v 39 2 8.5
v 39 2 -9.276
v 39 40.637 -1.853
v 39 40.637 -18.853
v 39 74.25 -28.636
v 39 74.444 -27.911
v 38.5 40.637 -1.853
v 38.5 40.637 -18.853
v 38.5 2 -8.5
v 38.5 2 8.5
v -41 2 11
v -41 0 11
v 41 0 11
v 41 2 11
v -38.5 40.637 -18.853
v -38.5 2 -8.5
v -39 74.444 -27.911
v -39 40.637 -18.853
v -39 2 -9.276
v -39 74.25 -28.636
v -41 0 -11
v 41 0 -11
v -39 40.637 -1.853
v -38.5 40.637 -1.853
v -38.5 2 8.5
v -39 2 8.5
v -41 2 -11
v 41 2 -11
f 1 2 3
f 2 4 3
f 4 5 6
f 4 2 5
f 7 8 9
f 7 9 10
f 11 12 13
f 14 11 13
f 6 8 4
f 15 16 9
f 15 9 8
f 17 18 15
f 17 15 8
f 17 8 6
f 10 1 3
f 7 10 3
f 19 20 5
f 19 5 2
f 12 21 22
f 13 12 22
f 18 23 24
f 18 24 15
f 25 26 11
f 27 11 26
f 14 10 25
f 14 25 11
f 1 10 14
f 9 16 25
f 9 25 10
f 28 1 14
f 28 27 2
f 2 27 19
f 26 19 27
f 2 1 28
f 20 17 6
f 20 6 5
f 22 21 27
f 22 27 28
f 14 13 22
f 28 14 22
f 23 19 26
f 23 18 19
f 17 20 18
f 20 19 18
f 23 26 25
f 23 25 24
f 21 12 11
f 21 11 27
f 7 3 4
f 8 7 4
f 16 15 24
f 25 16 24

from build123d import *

# Parameters (mm, degrees)
SKETCH1_W           = 82
SKETCH1_H           = 22
BOSS_EXTRUDE1_DEPTH = 2
EXTRUDE_THIN2_DEPTH = 78
BOSS_EXTRUDE2_DEPTH = 0.5
BOSS_EXTRUDE3_DEPTH = 0.5


with BuildPart() as part:
    # Sketch1 → Boss-Extrude1 (new body)
    with BuildSketch(Plane(origin=(0, 0, 0), x_dir=(1, 0, 0), z_dir=(0, 1, 0))):
        Rectangle(SKETCH1_W, SKETCH1_H)
    extrude(amount=BOSS_EXTRUDE1_DEPTH)

    # Sketch4 → Extrude-Thin2 (add)
    with BuildSketch(Plane(origin=(-39, 0, 0), x_dir=(0, 0, -1), z_dir=(1, 0, 0))):
        Polygon((8.5, 2), (27.911428383, 74.444436972), (28.635872752, 74.250322688), (9.22444437, 1.805885716), align=None)
    extrude(amount=EXTRUDE_THIN2_DEPTH)

    # Sketch5 → Boss-Extrude2 (add)
    with BuildSketch(Plane(origin=(39, 0, 0), x_dir=(0, 0, -1), z_dir=(1, 0, 0))):
        Polygon((-8.5, 2), (1.852761804, 40.637033052), (18.852761804, 40.637033052), (8.5, 2), align=None)
    extrude(amount=-BOSS_EXTRUDE2_DEPTH)

    # Sketch6 → Boss-Extrude3 (add)
    with BuildSketch(Plane(origin=(-39, 0, 0), x_dir=(0, 0, -1), z_dir=(1, 0, 0))):
        Polygon((-8.5, 2), (1.852761804, 40.637033052), (18.852761804, 40.637033052), (8.5, 2), align=None)
    extrude(amount=BOSS_EXTRUDE3_DEPTH)


solid = part.part
